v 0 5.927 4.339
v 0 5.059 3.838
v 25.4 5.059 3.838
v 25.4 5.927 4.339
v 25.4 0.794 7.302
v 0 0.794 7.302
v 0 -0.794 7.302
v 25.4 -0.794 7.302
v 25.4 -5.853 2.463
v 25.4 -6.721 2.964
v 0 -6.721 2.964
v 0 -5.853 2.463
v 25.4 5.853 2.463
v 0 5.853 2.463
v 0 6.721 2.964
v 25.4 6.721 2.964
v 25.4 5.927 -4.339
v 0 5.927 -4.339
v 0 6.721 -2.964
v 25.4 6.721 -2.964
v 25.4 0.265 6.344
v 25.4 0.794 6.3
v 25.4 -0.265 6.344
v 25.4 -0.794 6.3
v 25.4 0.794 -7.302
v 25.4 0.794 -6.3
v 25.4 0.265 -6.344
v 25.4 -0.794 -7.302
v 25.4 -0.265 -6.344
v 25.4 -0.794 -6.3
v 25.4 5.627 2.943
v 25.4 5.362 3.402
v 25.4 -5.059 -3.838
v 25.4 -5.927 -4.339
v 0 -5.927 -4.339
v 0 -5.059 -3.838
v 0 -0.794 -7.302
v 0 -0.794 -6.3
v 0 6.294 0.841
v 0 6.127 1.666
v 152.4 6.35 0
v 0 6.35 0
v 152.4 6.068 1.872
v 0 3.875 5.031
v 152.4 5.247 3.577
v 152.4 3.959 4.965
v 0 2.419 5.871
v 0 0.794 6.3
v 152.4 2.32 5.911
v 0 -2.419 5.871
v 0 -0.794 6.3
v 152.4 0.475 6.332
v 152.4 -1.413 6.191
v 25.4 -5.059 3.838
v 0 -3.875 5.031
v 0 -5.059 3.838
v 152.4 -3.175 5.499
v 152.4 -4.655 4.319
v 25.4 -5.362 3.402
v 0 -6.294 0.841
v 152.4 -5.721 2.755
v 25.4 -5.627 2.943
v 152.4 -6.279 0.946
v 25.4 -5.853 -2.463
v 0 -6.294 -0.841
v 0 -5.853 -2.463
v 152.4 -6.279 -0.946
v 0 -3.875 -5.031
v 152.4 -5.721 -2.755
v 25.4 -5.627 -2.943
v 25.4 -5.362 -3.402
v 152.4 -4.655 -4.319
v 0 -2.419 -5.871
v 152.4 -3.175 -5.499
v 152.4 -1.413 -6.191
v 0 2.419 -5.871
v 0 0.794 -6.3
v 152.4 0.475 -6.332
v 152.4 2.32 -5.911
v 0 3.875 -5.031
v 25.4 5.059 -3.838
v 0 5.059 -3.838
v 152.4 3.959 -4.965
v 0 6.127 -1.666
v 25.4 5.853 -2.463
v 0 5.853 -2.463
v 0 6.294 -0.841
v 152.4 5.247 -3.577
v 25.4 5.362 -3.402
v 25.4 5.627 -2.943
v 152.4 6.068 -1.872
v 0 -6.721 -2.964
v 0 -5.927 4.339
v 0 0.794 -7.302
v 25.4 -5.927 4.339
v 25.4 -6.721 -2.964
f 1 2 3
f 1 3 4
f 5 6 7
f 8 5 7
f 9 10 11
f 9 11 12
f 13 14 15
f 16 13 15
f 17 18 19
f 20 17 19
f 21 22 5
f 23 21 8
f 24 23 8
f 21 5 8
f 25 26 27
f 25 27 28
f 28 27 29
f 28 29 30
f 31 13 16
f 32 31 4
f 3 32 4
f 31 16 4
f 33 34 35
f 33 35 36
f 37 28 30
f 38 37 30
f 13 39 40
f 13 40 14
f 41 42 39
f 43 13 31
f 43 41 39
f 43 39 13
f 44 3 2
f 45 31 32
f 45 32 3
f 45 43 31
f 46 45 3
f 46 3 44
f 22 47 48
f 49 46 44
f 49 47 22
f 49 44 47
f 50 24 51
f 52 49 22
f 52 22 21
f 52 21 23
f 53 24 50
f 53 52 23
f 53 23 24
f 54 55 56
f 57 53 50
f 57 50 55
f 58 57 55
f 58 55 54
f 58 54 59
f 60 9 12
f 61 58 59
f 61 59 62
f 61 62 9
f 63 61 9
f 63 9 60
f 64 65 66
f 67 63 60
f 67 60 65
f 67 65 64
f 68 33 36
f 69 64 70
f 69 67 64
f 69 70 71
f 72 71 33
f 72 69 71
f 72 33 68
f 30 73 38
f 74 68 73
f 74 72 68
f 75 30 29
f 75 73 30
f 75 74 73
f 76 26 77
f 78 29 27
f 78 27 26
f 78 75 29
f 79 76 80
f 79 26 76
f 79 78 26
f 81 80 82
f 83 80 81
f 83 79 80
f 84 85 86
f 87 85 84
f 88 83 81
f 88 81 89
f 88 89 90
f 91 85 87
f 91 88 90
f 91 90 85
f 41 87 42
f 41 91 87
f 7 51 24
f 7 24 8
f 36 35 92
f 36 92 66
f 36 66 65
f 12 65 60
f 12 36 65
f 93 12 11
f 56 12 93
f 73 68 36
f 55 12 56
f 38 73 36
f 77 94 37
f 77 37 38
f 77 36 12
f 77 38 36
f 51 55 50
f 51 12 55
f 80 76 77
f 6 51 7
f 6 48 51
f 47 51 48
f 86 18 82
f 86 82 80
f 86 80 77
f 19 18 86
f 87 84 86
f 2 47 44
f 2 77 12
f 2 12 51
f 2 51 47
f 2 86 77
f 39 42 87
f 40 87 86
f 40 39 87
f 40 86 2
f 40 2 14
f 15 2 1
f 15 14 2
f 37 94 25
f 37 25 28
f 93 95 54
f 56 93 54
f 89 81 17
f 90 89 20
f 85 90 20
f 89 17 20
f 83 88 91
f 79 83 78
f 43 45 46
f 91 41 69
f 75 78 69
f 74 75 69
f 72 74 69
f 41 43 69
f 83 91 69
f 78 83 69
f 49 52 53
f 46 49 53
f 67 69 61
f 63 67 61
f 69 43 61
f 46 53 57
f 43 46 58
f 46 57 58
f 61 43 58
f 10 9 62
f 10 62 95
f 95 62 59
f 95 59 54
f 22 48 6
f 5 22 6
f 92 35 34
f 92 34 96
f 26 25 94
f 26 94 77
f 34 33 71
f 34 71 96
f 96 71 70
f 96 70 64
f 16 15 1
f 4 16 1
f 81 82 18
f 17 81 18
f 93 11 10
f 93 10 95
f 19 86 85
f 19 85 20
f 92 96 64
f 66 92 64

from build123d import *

# Parameters (mm, degrees)
F0_W     = 152.4
F0_H     = 6.35
F2_W     = 1.5875
F2_H     = 14.605
F3_DEPTH = 25.4
F4_COUNT = 6


with BuildPart() as f1:
    # F0 (on Top) → F1 (revolve)
    with BuildSketch(Plane.XY):
        with Locations((76.2, 3.175)):
            Rectangle(F0_W, F0_H)
    revolve(axis=Axis((76.2, 0, 0), (1, 0, 0)))

    # F2 (on face) → F3 (join)
    with BuildSketch(Plane(origin=(0, 0, 0), x_dir=(0, -1, 0), z_dir=(-1, 0, 0))):
        Rectangle(F2_W, F2_H)
    extrude(amount=-F3_DEPTH)

    # F4: F1 ×6 about axis
    f4_axis = Axis((152.4, 0, 0), (-1, 0, 0))


with BuildPart() as f1_1:
    add(f1.part)
    for i in range(1, F4_COUNT):
        add(f1.part.rotate(f4_axis, i * 360 / F4_COUNT))


solid = f1_1.part
